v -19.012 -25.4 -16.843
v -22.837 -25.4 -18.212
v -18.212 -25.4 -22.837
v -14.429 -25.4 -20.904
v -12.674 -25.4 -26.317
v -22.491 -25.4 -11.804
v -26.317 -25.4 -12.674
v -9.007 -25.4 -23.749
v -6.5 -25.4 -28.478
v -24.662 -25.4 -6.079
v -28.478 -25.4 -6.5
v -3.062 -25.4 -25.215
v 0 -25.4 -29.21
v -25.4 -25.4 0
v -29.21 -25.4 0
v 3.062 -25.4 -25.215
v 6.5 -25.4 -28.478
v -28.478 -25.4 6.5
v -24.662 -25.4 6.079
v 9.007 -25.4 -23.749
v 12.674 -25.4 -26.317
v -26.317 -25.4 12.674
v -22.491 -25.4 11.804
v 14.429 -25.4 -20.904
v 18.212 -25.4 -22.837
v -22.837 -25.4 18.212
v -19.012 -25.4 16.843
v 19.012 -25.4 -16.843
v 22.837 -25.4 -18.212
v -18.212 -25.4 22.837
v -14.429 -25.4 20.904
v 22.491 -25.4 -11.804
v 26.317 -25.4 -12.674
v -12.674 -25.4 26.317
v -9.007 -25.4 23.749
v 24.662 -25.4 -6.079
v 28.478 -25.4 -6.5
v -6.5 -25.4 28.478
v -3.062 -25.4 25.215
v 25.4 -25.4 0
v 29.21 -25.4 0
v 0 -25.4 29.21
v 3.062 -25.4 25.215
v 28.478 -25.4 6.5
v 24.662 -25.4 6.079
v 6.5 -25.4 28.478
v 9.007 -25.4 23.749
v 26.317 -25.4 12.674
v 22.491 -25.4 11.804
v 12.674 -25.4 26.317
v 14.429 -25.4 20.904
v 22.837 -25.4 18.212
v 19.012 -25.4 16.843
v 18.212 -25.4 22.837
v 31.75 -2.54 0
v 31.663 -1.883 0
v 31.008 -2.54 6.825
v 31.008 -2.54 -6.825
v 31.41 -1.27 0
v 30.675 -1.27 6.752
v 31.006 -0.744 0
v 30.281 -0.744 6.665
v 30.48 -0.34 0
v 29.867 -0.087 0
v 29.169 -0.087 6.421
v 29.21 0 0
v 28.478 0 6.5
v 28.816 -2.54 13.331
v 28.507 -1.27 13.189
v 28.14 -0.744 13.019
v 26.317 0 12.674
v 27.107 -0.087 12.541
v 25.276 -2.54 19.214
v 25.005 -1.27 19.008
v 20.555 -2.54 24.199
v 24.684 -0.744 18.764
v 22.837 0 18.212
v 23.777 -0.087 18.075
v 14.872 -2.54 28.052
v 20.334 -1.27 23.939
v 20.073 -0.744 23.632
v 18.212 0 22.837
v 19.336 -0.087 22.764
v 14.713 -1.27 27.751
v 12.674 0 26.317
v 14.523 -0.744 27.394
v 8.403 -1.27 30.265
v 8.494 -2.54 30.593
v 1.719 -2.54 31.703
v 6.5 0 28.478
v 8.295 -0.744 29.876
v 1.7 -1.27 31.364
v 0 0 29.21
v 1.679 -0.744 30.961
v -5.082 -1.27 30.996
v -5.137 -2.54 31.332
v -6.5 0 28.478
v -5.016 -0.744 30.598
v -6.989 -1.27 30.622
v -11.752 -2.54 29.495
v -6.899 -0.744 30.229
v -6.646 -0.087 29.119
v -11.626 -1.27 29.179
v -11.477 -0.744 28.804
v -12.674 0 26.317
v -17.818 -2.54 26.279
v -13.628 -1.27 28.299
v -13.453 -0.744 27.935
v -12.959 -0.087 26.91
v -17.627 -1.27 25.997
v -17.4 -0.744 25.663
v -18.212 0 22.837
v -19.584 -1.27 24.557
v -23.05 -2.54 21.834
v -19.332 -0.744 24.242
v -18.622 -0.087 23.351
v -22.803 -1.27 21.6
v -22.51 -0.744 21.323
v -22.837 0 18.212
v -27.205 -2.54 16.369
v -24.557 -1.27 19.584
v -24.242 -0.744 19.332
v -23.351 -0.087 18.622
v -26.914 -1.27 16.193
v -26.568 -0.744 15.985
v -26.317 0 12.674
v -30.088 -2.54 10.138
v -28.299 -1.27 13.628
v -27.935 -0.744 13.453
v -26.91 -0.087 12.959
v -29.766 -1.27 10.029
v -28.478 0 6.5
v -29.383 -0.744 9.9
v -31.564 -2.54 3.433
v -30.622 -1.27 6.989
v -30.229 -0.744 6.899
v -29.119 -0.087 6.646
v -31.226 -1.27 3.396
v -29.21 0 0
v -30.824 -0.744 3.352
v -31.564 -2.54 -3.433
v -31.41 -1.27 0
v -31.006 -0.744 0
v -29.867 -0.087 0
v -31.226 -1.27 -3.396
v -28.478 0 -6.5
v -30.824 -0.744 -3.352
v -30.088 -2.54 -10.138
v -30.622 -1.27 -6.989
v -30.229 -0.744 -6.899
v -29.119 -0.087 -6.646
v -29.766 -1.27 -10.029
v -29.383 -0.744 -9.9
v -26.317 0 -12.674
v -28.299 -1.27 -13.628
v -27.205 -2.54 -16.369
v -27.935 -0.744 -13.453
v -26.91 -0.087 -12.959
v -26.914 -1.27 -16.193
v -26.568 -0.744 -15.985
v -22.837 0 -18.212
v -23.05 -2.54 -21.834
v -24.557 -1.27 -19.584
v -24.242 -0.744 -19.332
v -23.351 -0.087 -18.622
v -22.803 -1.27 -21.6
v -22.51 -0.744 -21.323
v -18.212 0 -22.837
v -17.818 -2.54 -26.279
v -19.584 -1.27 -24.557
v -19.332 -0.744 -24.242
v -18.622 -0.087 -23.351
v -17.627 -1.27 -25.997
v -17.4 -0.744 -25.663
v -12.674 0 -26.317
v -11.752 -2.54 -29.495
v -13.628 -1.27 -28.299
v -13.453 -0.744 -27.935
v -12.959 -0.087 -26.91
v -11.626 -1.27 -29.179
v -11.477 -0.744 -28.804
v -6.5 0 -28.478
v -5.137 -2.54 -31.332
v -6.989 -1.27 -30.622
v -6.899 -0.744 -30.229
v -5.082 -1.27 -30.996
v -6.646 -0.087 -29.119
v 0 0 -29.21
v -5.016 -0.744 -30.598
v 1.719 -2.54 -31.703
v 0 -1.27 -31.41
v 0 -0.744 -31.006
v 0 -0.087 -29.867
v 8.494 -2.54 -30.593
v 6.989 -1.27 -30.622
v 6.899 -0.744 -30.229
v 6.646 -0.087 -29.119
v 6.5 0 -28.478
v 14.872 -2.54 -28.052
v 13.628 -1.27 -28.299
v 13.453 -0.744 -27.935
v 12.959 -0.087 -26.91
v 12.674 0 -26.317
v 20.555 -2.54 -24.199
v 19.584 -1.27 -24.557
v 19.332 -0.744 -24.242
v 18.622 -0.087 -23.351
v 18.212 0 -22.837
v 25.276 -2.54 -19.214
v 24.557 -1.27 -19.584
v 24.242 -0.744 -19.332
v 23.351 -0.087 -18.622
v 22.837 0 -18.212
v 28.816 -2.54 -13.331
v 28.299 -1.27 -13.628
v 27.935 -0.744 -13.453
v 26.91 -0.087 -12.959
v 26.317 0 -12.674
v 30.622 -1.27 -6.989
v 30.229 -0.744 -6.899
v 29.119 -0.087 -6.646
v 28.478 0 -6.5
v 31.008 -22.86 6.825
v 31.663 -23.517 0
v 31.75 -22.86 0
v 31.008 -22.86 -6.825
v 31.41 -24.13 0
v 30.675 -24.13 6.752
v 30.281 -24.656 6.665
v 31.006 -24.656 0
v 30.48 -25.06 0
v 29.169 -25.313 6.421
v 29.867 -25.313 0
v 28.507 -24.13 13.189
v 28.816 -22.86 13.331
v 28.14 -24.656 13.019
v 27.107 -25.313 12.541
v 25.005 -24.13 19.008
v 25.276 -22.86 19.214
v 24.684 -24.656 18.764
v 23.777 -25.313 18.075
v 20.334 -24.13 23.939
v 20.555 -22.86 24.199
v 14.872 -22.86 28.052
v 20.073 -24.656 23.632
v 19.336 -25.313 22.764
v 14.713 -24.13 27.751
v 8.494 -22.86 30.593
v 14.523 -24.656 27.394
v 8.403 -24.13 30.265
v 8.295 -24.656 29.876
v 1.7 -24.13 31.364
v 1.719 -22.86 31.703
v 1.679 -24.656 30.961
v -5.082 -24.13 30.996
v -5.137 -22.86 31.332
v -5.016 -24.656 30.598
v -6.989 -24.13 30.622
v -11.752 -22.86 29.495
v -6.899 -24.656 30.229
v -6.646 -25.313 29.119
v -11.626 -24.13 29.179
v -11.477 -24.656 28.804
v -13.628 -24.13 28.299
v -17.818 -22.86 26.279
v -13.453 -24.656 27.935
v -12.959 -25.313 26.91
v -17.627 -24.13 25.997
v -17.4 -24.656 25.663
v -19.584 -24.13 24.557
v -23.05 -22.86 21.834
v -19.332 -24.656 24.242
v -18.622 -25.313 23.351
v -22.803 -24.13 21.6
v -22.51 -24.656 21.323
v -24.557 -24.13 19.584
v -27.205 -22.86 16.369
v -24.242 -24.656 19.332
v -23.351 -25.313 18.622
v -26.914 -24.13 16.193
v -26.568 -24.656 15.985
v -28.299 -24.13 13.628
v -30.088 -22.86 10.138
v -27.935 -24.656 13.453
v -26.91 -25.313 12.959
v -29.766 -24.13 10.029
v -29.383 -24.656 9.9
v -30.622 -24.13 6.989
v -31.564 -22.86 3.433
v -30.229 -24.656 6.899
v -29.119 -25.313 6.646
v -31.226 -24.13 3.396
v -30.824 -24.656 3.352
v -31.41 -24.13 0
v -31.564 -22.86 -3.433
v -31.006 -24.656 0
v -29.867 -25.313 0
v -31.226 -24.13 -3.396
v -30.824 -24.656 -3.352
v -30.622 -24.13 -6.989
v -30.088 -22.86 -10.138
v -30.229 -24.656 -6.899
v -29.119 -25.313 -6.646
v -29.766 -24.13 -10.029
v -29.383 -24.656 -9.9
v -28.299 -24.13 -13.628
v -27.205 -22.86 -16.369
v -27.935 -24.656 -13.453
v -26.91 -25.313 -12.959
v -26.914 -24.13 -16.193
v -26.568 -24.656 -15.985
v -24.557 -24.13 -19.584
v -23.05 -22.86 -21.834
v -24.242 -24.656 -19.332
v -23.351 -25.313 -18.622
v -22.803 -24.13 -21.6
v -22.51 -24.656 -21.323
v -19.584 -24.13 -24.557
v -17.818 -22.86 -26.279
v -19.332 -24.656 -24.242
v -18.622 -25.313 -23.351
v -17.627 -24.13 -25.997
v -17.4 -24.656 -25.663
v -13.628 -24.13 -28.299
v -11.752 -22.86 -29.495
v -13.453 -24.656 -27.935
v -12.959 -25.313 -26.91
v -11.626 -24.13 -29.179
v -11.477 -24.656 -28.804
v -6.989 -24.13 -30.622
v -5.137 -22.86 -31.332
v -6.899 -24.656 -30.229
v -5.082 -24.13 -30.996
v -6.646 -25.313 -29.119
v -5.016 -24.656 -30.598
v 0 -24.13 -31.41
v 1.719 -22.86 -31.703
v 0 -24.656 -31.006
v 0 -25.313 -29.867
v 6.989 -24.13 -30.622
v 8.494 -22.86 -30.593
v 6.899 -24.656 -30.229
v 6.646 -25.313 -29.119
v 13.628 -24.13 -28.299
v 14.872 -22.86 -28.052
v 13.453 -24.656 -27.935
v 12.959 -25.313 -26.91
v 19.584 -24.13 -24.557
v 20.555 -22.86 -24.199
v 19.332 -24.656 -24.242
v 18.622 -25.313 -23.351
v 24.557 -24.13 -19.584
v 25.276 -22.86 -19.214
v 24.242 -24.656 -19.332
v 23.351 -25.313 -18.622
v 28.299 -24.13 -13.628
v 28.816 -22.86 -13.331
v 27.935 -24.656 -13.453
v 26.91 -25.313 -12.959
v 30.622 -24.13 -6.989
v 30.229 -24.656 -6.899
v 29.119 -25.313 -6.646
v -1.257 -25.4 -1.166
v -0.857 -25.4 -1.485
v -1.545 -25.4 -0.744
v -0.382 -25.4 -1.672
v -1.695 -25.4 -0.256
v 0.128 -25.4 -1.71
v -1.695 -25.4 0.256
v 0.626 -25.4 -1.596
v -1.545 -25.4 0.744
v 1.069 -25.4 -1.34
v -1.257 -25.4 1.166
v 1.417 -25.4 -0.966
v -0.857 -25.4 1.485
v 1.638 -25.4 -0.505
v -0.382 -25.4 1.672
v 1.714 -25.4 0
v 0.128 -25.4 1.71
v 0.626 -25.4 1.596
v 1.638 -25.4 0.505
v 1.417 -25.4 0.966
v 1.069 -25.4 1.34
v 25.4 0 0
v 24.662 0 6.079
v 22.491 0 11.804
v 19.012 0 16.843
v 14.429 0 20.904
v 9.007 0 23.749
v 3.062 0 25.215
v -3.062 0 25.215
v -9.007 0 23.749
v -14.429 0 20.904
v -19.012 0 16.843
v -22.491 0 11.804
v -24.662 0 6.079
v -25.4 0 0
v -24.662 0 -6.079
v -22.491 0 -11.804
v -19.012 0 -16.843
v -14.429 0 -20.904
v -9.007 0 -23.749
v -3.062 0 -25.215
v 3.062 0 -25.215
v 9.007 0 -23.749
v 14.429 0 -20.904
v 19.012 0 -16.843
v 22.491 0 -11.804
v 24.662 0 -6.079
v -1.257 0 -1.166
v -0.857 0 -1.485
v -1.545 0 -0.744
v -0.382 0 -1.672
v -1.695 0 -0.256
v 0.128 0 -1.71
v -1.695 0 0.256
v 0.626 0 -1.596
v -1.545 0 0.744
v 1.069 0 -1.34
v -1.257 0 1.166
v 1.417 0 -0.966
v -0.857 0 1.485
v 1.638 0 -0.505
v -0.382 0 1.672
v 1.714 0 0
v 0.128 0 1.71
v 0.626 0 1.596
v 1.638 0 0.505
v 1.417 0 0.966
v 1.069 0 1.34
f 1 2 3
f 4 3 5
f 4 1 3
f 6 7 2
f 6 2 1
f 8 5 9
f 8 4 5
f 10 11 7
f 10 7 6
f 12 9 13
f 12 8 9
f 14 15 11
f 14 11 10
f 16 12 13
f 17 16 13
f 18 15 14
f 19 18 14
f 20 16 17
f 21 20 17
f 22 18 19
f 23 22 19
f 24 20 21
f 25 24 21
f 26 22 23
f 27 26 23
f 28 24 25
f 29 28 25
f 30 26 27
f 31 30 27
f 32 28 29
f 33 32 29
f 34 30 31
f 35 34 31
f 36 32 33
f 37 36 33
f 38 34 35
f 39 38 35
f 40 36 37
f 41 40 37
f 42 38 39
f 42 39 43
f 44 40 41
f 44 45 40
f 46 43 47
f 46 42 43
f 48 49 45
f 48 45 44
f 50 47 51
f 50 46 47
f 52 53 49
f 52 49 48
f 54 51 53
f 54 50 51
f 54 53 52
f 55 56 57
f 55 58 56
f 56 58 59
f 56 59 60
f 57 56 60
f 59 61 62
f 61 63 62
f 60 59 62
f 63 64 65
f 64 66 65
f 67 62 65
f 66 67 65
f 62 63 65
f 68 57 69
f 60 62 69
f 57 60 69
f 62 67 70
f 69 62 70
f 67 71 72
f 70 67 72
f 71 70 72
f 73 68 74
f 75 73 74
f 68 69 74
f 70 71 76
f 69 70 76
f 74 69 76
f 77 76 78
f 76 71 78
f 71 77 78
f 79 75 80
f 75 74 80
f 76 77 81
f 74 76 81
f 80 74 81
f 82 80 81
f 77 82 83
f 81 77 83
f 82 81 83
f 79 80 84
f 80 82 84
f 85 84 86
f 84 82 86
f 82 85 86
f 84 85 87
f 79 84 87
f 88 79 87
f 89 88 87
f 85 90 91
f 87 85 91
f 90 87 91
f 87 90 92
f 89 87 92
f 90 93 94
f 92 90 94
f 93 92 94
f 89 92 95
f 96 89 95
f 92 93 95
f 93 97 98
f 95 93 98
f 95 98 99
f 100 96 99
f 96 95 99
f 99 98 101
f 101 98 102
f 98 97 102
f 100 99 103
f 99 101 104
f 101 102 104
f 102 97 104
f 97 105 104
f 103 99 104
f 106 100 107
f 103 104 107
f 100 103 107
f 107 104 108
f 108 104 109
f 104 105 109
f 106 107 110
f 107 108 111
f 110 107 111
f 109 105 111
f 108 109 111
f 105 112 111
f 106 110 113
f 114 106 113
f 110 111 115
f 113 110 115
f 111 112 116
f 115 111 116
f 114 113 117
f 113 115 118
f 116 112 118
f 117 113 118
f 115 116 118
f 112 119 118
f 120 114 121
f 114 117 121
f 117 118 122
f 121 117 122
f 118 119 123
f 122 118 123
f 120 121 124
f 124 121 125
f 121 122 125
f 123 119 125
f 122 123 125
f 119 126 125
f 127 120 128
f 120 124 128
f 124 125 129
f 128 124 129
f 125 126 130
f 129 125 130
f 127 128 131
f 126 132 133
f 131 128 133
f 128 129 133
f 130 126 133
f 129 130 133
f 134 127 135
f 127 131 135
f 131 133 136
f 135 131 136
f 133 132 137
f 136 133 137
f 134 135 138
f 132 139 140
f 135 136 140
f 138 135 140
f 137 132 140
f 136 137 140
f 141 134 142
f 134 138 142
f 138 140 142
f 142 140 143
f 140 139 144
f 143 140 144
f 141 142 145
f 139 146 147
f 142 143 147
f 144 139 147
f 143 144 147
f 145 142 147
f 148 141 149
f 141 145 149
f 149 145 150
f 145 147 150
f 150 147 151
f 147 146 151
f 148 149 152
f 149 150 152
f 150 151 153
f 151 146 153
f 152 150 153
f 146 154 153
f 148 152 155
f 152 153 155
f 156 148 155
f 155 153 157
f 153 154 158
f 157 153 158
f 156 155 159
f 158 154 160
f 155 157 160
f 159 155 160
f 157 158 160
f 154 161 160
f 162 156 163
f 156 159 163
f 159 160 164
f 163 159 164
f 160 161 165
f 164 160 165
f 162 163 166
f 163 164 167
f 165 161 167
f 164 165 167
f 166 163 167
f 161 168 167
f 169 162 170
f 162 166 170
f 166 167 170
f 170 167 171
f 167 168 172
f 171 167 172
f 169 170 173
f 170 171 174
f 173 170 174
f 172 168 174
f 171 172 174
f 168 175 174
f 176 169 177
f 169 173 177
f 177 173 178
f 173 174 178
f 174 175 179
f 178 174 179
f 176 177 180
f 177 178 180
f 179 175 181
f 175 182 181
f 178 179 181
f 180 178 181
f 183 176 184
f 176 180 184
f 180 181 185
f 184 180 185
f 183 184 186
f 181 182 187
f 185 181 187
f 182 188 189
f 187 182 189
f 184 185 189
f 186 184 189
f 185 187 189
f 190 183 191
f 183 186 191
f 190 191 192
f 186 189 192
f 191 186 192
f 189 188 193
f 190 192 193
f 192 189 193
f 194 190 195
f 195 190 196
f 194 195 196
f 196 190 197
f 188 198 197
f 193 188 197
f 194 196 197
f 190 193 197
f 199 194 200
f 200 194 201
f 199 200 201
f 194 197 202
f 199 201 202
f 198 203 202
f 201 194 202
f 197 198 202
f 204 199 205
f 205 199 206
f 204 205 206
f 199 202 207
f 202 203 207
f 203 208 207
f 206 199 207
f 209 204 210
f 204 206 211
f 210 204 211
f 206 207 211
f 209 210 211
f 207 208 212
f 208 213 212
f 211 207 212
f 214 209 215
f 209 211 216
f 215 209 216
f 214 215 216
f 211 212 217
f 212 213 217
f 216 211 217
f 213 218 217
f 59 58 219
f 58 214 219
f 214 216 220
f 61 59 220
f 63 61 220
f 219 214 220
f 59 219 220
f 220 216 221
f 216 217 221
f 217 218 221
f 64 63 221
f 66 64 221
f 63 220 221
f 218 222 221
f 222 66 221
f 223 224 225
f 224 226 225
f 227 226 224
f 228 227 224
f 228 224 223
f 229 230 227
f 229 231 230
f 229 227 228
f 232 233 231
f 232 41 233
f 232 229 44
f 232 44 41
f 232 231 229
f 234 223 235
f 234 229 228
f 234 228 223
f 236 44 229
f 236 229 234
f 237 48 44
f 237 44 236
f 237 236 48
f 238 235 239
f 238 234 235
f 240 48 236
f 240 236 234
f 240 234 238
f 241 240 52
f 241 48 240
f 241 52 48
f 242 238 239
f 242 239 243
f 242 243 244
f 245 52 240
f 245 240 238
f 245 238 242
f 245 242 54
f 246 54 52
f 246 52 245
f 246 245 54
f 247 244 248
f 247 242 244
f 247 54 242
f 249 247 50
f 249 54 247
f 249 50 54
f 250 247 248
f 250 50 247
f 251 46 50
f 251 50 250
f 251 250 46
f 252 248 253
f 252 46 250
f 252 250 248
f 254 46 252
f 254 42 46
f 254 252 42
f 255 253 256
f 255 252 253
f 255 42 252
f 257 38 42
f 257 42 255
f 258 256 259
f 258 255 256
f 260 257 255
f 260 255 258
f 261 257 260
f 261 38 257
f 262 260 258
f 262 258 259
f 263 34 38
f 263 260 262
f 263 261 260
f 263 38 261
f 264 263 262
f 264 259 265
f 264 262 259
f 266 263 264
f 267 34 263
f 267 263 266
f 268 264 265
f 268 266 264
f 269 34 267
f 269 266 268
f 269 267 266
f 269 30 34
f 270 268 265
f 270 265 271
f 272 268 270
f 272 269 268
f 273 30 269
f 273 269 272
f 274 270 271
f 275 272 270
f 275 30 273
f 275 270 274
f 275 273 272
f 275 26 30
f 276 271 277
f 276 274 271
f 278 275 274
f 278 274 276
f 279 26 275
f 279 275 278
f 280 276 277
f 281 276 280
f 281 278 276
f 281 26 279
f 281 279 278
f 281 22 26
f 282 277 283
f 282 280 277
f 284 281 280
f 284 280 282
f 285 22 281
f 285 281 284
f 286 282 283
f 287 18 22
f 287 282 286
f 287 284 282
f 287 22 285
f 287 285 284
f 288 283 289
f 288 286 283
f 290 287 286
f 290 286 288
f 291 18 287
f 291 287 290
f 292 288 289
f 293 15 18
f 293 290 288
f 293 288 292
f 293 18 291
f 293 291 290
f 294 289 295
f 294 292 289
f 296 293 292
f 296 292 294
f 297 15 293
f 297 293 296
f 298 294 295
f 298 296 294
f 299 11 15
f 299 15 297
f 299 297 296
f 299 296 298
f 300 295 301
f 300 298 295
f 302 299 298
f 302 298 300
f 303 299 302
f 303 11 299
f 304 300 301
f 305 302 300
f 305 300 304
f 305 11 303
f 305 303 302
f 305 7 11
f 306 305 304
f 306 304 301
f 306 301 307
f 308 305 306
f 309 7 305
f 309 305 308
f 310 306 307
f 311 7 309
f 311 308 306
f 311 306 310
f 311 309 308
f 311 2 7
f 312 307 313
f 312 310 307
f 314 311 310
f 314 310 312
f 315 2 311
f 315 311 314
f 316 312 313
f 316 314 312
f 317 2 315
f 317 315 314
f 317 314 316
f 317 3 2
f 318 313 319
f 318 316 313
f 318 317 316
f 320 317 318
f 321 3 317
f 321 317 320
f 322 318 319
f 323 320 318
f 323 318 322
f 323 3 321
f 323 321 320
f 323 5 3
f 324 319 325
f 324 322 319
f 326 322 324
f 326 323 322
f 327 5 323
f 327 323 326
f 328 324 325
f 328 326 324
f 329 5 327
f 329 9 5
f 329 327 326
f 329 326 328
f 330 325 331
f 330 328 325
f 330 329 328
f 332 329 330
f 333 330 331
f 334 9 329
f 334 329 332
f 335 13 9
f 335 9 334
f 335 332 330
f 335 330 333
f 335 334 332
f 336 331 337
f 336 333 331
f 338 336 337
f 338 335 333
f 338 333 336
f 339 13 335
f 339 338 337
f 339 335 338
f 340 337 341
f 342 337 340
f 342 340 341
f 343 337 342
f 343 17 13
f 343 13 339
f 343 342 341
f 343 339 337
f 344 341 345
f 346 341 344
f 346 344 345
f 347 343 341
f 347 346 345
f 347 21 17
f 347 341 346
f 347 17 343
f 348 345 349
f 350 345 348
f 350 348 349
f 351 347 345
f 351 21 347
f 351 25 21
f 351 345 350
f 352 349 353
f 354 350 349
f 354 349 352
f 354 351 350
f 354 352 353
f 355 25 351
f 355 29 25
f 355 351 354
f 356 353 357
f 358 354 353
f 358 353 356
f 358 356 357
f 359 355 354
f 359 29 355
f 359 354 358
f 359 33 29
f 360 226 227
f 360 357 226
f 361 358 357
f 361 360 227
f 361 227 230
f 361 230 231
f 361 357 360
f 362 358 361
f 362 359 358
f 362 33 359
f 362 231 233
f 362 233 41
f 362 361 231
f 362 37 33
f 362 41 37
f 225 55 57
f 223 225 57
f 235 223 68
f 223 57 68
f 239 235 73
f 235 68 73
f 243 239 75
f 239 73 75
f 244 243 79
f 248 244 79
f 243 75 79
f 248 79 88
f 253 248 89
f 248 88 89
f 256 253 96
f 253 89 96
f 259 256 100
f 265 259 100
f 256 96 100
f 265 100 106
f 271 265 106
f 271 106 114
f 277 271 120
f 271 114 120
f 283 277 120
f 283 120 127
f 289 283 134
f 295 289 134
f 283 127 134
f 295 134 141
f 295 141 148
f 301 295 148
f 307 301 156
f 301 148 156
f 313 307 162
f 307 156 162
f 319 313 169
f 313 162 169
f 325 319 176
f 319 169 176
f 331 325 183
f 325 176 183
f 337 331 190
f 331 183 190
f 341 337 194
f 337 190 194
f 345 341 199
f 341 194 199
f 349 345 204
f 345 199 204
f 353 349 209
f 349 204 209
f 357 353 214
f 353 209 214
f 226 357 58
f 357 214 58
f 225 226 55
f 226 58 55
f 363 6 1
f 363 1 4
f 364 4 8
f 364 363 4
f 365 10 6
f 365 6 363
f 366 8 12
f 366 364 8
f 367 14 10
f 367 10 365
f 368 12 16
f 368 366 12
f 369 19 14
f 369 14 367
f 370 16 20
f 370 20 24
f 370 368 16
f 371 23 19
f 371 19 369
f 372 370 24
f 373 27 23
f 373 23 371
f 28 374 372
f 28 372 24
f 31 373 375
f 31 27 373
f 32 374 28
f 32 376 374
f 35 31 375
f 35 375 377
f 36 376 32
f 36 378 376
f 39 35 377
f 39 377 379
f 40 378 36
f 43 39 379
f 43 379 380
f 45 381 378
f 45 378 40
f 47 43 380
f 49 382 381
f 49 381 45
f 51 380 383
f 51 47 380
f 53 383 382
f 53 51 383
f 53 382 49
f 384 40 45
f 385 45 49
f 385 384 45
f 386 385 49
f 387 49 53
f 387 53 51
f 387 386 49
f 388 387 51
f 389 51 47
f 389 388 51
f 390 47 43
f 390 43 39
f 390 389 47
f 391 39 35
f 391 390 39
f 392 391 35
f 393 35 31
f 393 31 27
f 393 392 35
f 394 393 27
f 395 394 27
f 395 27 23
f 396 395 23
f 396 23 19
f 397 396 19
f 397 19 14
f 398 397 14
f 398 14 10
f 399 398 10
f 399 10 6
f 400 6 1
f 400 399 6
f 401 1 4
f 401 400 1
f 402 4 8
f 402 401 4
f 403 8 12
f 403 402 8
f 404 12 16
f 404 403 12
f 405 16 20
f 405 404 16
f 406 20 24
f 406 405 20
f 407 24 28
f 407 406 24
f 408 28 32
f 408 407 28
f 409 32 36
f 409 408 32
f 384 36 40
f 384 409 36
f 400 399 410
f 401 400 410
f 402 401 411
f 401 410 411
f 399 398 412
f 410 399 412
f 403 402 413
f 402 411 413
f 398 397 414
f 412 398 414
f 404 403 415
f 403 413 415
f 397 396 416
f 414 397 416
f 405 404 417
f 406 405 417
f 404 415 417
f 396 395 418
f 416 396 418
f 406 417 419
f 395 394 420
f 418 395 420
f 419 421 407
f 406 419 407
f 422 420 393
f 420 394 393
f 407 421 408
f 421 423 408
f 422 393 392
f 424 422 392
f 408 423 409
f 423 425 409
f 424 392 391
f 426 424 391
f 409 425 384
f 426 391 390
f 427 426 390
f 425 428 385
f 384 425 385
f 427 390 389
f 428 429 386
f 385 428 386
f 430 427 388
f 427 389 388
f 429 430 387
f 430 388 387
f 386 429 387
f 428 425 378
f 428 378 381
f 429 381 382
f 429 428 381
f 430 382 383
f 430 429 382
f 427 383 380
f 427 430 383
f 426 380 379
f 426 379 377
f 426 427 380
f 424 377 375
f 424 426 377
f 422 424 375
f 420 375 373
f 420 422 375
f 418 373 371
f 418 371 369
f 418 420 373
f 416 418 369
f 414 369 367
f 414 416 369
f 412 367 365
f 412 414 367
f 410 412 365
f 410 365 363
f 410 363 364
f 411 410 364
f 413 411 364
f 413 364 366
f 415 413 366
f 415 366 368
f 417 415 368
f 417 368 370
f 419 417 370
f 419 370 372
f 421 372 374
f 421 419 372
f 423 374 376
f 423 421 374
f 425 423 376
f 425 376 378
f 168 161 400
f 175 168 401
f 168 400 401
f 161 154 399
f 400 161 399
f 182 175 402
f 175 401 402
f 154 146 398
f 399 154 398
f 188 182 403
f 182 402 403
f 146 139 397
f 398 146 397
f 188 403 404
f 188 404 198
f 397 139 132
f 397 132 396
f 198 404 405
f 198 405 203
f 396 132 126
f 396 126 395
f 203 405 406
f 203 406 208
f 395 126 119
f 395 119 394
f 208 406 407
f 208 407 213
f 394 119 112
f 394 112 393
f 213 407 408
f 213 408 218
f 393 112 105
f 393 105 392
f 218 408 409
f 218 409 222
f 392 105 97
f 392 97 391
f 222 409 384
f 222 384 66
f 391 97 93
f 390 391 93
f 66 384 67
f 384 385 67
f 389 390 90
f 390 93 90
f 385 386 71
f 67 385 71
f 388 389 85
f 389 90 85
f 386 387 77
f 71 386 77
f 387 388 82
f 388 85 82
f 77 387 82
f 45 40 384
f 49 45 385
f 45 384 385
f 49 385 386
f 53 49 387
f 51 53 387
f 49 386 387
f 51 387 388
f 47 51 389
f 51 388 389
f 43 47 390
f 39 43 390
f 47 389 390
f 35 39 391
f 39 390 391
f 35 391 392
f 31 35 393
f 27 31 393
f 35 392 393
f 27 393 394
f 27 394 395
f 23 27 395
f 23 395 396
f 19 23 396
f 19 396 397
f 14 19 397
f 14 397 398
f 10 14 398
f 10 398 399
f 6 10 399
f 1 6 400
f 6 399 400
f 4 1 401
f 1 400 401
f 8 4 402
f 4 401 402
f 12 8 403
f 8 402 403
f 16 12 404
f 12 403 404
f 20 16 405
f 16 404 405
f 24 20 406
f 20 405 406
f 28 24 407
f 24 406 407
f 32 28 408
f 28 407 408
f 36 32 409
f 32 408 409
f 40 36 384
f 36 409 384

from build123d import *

# Parameters (mm, degrees)
F0_R     = 25.4
F0_R_2   = 1.7145
F1_DEPTH = 25.4
F0_R_3   = 31.75
F2_DEPTH = 25.4
F3_R     = 2.54
F4_R     = 2.54


with BuildPart() as f1:
    # F0 (on Front) → F1 (new body)
    with BuildSketch(Plane.XZ):
        Circle(F0_R)
        Circle(F0_R_2, mode=Mode.SUBTRACT)
    extrude(amount=F1_DEPTH)


with BuildPart() as f2:
    # F0 (on Front) → F2 (new body)
    with BuildSketch(Plane.XZ):
        Circle(F0_R_3)
        Circle(F0_R, mode=Mode.SUBTRACT)
    extrude(amount=F2_DEPTH)

    # F3
    f3_edges = [f2.edges().sort_by_distance(p)[0] for p in [
        (-31.75, -25.4, 0),
    ]]
    fillet(f3_edges, radius=F3_R)

    # F4
    f4_edges = [f2.edges().sort_by_distance(p)[0] for p in [
        (-31.75, 0, 0),
    ]]
    fillet(f4_edges, radius=F4_R)


solid = Compound([f1.part, f2.part])
